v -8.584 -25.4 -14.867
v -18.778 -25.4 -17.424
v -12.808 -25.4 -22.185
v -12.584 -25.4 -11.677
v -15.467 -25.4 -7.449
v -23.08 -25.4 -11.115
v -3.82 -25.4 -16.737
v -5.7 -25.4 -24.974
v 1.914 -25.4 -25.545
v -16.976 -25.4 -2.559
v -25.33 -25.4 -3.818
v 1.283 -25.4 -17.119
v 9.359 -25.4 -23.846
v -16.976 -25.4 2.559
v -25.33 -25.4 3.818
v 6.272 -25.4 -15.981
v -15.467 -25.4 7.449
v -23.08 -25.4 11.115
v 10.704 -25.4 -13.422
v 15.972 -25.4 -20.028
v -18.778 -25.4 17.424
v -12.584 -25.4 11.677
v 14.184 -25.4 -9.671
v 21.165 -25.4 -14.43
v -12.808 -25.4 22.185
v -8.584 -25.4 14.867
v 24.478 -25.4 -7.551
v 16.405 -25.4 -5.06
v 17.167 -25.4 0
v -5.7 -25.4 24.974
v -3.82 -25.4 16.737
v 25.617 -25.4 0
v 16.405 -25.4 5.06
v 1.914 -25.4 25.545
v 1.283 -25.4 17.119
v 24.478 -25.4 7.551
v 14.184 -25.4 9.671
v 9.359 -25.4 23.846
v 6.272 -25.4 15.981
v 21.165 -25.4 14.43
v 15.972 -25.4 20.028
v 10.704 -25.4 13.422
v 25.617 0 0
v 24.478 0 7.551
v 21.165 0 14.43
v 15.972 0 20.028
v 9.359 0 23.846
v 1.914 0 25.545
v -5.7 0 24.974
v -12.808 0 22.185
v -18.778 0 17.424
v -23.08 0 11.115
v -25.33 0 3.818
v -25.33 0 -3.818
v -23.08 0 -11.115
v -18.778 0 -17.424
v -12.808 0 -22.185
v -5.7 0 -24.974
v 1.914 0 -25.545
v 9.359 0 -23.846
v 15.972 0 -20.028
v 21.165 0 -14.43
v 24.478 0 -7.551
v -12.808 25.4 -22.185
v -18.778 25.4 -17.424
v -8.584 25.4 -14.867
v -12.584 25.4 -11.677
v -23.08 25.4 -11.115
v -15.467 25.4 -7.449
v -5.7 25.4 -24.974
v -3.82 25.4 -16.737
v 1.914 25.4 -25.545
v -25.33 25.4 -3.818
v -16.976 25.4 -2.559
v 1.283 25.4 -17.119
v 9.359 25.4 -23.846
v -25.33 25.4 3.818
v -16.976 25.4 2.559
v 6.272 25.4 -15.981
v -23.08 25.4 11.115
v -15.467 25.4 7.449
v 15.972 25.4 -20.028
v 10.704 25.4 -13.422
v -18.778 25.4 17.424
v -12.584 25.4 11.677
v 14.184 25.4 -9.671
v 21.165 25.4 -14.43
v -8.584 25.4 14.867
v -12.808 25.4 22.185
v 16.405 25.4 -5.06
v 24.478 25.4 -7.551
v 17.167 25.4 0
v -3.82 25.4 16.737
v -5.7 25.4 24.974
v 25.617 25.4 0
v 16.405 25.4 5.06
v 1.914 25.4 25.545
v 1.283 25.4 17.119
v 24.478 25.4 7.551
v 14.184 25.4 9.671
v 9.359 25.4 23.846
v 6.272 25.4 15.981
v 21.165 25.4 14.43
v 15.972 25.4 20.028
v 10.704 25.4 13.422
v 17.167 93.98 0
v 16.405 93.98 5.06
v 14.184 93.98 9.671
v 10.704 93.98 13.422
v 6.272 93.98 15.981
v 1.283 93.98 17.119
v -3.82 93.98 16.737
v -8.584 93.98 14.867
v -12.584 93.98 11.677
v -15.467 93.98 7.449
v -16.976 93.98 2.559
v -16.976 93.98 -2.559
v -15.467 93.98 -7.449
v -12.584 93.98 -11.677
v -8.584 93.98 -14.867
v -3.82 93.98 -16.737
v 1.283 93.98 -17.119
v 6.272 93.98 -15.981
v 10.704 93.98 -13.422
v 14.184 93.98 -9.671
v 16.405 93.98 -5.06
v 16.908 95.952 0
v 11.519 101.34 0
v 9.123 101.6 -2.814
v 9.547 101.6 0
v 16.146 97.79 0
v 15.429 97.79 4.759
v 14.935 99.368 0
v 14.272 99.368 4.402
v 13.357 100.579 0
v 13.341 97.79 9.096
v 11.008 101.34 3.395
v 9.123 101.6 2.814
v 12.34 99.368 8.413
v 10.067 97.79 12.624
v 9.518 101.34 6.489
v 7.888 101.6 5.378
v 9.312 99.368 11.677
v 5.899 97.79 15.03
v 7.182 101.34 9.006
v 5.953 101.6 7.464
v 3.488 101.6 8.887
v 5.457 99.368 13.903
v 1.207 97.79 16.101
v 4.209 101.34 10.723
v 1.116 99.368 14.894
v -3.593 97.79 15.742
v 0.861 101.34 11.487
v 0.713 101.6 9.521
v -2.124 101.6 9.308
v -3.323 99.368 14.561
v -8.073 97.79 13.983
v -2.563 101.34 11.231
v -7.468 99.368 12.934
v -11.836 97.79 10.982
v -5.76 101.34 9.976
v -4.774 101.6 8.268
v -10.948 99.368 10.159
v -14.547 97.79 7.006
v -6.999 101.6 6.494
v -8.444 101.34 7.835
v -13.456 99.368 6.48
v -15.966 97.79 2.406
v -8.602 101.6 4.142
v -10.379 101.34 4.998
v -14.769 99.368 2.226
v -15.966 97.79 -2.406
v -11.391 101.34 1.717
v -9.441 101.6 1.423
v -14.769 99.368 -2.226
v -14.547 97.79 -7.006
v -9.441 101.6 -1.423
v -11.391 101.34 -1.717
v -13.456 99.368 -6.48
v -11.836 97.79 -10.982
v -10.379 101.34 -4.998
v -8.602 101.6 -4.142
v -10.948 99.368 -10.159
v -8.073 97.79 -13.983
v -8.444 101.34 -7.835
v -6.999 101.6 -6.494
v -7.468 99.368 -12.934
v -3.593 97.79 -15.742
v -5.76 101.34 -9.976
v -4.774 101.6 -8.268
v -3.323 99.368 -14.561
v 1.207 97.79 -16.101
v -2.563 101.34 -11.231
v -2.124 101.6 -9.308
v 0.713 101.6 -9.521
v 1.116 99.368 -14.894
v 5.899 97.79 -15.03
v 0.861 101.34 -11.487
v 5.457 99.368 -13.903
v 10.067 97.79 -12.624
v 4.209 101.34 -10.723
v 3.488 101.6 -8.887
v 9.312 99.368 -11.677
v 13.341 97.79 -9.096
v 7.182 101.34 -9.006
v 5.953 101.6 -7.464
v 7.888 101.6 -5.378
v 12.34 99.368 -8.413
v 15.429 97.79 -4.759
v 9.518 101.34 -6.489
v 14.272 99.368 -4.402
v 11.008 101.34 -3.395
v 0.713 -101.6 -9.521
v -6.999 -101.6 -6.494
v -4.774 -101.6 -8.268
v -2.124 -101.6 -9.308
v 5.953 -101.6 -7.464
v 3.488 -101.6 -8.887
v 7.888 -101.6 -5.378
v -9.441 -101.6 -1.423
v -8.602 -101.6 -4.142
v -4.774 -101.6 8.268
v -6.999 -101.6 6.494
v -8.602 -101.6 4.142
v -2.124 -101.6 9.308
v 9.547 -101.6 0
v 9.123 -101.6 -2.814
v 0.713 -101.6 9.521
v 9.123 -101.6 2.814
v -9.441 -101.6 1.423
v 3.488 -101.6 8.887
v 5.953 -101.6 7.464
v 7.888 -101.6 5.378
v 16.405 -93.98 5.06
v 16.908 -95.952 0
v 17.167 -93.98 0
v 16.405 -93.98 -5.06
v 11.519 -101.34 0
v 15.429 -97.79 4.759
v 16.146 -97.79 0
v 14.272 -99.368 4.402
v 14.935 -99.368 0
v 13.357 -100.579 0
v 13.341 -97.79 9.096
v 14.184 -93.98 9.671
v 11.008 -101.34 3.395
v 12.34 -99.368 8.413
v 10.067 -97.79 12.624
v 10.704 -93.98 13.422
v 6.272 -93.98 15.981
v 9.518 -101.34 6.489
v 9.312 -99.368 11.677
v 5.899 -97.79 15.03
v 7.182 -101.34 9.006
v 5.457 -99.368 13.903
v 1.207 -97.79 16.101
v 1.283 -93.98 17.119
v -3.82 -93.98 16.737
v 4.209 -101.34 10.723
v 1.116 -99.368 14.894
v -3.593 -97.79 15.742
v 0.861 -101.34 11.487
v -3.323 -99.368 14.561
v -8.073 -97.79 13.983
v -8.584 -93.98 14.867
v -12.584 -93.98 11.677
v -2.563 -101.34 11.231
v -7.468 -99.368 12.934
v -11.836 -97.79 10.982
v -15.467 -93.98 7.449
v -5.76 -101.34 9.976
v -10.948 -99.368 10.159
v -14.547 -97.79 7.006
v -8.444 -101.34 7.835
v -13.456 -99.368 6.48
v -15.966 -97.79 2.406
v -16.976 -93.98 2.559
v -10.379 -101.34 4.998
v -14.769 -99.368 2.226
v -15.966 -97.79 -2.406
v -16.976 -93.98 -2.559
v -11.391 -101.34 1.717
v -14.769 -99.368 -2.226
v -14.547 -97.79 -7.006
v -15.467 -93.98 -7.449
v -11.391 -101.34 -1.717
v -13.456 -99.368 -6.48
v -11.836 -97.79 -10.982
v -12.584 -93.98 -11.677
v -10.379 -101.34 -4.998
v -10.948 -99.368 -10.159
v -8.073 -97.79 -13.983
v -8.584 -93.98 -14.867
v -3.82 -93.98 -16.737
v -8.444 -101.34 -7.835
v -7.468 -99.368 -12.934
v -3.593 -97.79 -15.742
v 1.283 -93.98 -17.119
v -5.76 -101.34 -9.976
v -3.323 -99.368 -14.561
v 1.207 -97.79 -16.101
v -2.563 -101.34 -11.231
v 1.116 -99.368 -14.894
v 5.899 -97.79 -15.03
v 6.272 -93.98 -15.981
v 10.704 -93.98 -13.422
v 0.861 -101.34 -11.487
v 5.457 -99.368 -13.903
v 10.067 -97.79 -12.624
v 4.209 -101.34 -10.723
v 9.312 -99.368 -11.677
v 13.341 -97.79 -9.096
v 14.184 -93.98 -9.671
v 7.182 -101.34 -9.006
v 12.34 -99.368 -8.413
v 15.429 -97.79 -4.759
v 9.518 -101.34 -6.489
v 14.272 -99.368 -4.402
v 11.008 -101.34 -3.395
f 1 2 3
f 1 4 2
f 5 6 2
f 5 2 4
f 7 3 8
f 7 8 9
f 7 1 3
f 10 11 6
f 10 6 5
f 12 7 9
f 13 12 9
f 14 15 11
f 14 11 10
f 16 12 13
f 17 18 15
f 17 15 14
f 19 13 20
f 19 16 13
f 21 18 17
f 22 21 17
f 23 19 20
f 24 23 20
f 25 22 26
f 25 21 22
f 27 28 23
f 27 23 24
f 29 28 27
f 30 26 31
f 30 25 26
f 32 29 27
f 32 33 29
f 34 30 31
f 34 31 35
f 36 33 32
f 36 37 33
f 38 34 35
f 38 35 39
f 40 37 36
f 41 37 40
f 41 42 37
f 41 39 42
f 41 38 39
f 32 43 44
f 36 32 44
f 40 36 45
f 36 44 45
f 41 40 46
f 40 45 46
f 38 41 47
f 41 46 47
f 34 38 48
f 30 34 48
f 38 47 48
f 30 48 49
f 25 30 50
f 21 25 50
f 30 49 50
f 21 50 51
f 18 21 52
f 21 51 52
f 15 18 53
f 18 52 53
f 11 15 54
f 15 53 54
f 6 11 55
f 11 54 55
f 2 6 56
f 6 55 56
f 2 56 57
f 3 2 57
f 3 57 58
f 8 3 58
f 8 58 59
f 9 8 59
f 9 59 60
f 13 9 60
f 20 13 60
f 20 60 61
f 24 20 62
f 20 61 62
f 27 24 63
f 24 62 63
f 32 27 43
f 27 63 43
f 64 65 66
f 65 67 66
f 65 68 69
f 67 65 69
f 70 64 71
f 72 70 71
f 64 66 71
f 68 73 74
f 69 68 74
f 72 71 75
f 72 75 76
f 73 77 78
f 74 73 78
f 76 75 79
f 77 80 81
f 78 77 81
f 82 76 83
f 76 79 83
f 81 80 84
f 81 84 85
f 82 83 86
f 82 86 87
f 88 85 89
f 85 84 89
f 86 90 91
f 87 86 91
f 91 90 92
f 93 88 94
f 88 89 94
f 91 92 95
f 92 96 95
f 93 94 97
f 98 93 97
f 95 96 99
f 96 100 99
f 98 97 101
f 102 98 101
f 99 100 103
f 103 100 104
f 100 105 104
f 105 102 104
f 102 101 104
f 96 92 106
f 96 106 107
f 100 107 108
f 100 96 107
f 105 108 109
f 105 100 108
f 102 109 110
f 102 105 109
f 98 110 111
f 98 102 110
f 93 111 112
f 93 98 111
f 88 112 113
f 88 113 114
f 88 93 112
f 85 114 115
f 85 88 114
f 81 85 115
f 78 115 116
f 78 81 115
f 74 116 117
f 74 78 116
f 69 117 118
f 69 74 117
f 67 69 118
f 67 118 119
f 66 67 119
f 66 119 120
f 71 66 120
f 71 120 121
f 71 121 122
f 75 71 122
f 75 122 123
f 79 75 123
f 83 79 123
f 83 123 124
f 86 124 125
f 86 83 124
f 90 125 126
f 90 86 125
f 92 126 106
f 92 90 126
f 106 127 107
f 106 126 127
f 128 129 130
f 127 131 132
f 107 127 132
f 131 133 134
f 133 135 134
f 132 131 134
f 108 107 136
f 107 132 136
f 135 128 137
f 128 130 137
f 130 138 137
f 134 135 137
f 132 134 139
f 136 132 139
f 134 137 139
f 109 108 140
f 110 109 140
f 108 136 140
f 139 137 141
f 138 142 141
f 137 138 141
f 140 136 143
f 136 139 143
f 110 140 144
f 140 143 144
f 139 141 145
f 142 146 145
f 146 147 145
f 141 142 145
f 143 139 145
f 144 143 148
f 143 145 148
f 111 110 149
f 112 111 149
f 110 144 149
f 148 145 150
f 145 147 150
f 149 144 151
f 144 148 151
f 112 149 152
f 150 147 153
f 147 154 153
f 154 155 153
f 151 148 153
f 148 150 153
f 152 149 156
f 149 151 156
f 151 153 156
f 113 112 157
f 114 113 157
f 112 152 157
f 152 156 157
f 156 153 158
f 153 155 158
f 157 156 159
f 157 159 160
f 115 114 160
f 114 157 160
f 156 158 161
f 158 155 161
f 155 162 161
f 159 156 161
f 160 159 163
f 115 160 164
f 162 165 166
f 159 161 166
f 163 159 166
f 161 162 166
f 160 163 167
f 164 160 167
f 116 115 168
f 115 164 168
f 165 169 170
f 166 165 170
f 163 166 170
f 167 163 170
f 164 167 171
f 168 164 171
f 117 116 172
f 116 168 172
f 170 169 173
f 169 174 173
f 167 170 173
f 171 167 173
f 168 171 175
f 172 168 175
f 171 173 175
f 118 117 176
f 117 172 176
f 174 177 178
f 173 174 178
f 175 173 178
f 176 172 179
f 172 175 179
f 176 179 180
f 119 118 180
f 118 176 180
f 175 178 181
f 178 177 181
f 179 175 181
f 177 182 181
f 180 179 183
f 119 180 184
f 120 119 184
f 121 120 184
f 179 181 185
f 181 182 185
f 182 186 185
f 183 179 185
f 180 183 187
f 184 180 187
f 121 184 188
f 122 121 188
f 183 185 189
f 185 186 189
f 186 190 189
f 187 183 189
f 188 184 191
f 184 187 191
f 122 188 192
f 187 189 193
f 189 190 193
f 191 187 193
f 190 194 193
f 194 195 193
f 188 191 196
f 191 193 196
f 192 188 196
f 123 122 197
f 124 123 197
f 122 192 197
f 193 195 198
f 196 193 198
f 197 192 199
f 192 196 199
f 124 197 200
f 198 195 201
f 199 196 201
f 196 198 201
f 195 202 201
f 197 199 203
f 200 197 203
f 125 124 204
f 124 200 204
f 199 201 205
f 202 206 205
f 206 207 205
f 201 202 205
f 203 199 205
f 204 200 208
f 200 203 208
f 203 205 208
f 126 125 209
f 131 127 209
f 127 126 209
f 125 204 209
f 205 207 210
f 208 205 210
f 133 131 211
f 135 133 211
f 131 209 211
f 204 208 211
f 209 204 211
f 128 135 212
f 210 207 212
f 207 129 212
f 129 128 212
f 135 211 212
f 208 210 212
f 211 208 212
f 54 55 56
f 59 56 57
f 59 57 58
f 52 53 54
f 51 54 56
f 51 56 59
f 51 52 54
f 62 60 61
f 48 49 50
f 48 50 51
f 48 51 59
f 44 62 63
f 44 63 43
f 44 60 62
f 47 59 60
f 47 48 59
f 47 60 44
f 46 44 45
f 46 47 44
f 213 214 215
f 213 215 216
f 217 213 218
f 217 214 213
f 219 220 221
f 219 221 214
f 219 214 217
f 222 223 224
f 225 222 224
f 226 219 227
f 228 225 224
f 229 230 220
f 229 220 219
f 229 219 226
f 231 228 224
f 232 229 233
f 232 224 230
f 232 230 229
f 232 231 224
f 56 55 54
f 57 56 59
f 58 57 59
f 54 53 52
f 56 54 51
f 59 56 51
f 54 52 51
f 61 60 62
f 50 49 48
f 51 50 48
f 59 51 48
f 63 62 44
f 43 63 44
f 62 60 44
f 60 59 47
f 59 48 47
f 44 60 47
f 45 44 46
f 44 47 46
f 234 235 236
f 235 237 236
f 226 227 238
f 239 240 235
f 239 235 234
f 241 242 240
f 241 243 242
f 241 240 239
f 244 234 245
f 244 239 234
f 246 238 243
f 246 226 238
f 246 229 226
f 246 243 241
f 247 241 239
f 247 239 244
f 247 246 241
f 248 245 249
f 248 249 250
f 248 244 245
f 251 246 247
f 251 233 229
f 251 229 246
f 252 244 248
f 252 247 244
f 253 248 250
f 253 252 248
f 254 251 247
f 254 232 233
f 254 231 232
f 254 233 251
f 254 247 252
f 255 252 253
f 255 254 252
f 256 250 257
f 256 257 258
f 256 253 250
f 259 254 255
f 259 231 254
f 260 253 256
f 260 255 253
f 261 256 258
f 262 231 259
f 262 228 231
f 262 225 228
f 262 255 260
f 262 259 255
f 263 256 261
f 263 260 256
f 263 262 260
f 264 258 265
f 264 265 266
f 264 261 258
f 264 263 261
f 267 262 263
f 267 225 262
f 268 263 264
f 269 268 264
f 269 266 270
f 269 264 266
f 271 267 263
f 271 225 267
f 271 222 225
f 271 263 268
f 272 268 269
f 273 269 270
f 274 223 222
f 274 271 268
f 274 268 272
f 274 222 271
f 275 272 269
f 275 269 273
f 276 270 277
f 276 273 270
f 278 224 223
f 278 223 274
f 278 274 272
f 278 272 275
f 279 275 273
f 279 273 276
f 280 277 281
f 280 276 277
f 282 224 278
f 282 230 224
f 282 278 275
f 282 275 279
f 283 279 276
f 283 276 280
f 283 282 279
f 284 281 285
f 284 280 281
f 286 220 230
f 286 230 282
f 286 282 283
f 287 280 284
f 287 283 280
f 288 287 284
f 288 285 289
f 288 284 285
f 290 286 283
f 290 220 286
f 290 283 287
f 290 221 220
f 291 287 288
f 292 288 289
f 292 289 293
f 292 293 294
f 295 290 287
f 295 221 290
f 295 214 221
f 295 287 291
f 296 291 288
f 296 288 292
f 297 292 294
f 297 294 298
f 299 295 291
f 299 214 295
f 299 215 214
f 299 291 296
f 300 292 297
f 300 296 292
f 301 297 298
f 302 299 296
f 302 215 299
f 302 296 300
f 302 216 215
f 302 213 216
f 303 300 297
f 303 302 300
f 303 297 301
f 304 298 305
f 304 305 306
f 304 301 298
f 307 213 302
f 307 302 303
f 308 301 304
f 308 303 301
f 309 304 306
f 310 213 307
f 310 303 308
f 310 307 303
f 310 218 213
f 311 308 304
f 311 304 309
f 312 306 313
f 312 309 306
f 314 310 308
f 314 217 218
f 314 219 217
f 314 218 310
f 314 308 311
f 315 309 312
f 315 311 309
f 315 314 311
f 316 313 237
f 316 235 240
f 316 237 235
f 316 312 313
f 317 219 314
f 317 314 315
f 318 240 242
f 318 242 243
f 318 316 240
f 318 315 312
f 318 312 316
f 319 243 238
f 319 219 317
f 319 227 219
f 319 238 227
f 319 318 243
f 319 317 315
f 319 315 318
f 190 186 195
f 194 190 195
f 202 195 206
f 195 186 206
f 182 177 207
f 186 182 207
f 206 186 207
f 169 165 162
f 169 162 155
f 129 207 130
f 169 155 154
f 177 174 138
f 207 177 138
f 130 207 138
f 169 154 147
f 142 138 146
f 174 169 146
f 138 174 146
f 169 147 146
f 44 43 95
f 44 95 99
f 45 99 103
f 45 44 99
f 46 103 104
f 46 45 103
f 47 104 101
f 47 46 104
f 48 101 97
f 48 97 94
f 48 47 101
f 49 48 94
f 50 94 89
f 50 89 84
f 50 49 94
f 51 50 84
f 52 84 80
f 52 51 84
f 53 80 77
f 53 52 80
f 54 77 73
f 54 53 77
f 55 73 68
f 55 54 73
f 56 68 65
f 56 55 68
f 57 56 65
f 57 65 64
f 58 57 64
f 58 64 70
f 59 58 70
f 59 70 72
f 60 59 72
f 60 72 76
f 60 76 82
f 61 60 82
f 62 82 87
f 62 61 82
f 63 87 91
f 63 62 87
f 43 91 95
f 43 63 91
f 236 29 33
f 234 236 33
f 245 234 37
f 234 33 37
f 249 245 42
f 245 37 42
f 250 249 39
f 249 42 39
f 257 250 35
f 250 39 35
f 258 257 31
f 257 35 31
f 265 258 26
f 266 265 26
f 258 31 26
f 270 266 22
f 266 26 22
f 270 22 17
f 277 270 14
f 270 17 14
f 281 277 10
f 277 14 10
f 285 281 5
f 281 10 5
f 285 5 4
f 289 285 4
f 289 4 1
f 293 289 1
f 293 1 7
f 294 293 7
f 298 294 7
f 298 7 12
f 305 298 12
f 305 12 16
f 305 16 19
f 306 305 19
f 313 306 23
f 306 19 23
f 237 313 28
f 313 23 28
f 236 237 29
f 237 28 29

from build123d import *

# Parameters (mm, degrees)
F0_R     = 25.616531
F1_DEPTH = 25.4
F2_R     = 17.167247
F3_DEPTH = 76.2
F4_R     = 7.62


with BuildPart() as f1:
    # F0 (on Front) → F1 (new body)
    with BuildSketch(Plane.XZ):
        Circle(F0_R)
    extrude(amount=F1_DEPTH)

    # F2 (on face) → F3 (join)
    with BuildSketch(Plane.XZ.offset(25.4)):
        Circle(F2_R)
    extrude(amount=F3_DEPTH)

    # F4
    f4_edges = [f1.edges().sort_by_distance(p)[0] for p in [
        (-17.167247, -101.6, 0),
    ]]
    fillet(f4_edges, radius=F4_R)


with BuildPart() as f5_1:
    # F5: instance of F1
    add(f1.part.mirror(Plane.XZ))


solid = Compound([f1.part, f5_1.part])
